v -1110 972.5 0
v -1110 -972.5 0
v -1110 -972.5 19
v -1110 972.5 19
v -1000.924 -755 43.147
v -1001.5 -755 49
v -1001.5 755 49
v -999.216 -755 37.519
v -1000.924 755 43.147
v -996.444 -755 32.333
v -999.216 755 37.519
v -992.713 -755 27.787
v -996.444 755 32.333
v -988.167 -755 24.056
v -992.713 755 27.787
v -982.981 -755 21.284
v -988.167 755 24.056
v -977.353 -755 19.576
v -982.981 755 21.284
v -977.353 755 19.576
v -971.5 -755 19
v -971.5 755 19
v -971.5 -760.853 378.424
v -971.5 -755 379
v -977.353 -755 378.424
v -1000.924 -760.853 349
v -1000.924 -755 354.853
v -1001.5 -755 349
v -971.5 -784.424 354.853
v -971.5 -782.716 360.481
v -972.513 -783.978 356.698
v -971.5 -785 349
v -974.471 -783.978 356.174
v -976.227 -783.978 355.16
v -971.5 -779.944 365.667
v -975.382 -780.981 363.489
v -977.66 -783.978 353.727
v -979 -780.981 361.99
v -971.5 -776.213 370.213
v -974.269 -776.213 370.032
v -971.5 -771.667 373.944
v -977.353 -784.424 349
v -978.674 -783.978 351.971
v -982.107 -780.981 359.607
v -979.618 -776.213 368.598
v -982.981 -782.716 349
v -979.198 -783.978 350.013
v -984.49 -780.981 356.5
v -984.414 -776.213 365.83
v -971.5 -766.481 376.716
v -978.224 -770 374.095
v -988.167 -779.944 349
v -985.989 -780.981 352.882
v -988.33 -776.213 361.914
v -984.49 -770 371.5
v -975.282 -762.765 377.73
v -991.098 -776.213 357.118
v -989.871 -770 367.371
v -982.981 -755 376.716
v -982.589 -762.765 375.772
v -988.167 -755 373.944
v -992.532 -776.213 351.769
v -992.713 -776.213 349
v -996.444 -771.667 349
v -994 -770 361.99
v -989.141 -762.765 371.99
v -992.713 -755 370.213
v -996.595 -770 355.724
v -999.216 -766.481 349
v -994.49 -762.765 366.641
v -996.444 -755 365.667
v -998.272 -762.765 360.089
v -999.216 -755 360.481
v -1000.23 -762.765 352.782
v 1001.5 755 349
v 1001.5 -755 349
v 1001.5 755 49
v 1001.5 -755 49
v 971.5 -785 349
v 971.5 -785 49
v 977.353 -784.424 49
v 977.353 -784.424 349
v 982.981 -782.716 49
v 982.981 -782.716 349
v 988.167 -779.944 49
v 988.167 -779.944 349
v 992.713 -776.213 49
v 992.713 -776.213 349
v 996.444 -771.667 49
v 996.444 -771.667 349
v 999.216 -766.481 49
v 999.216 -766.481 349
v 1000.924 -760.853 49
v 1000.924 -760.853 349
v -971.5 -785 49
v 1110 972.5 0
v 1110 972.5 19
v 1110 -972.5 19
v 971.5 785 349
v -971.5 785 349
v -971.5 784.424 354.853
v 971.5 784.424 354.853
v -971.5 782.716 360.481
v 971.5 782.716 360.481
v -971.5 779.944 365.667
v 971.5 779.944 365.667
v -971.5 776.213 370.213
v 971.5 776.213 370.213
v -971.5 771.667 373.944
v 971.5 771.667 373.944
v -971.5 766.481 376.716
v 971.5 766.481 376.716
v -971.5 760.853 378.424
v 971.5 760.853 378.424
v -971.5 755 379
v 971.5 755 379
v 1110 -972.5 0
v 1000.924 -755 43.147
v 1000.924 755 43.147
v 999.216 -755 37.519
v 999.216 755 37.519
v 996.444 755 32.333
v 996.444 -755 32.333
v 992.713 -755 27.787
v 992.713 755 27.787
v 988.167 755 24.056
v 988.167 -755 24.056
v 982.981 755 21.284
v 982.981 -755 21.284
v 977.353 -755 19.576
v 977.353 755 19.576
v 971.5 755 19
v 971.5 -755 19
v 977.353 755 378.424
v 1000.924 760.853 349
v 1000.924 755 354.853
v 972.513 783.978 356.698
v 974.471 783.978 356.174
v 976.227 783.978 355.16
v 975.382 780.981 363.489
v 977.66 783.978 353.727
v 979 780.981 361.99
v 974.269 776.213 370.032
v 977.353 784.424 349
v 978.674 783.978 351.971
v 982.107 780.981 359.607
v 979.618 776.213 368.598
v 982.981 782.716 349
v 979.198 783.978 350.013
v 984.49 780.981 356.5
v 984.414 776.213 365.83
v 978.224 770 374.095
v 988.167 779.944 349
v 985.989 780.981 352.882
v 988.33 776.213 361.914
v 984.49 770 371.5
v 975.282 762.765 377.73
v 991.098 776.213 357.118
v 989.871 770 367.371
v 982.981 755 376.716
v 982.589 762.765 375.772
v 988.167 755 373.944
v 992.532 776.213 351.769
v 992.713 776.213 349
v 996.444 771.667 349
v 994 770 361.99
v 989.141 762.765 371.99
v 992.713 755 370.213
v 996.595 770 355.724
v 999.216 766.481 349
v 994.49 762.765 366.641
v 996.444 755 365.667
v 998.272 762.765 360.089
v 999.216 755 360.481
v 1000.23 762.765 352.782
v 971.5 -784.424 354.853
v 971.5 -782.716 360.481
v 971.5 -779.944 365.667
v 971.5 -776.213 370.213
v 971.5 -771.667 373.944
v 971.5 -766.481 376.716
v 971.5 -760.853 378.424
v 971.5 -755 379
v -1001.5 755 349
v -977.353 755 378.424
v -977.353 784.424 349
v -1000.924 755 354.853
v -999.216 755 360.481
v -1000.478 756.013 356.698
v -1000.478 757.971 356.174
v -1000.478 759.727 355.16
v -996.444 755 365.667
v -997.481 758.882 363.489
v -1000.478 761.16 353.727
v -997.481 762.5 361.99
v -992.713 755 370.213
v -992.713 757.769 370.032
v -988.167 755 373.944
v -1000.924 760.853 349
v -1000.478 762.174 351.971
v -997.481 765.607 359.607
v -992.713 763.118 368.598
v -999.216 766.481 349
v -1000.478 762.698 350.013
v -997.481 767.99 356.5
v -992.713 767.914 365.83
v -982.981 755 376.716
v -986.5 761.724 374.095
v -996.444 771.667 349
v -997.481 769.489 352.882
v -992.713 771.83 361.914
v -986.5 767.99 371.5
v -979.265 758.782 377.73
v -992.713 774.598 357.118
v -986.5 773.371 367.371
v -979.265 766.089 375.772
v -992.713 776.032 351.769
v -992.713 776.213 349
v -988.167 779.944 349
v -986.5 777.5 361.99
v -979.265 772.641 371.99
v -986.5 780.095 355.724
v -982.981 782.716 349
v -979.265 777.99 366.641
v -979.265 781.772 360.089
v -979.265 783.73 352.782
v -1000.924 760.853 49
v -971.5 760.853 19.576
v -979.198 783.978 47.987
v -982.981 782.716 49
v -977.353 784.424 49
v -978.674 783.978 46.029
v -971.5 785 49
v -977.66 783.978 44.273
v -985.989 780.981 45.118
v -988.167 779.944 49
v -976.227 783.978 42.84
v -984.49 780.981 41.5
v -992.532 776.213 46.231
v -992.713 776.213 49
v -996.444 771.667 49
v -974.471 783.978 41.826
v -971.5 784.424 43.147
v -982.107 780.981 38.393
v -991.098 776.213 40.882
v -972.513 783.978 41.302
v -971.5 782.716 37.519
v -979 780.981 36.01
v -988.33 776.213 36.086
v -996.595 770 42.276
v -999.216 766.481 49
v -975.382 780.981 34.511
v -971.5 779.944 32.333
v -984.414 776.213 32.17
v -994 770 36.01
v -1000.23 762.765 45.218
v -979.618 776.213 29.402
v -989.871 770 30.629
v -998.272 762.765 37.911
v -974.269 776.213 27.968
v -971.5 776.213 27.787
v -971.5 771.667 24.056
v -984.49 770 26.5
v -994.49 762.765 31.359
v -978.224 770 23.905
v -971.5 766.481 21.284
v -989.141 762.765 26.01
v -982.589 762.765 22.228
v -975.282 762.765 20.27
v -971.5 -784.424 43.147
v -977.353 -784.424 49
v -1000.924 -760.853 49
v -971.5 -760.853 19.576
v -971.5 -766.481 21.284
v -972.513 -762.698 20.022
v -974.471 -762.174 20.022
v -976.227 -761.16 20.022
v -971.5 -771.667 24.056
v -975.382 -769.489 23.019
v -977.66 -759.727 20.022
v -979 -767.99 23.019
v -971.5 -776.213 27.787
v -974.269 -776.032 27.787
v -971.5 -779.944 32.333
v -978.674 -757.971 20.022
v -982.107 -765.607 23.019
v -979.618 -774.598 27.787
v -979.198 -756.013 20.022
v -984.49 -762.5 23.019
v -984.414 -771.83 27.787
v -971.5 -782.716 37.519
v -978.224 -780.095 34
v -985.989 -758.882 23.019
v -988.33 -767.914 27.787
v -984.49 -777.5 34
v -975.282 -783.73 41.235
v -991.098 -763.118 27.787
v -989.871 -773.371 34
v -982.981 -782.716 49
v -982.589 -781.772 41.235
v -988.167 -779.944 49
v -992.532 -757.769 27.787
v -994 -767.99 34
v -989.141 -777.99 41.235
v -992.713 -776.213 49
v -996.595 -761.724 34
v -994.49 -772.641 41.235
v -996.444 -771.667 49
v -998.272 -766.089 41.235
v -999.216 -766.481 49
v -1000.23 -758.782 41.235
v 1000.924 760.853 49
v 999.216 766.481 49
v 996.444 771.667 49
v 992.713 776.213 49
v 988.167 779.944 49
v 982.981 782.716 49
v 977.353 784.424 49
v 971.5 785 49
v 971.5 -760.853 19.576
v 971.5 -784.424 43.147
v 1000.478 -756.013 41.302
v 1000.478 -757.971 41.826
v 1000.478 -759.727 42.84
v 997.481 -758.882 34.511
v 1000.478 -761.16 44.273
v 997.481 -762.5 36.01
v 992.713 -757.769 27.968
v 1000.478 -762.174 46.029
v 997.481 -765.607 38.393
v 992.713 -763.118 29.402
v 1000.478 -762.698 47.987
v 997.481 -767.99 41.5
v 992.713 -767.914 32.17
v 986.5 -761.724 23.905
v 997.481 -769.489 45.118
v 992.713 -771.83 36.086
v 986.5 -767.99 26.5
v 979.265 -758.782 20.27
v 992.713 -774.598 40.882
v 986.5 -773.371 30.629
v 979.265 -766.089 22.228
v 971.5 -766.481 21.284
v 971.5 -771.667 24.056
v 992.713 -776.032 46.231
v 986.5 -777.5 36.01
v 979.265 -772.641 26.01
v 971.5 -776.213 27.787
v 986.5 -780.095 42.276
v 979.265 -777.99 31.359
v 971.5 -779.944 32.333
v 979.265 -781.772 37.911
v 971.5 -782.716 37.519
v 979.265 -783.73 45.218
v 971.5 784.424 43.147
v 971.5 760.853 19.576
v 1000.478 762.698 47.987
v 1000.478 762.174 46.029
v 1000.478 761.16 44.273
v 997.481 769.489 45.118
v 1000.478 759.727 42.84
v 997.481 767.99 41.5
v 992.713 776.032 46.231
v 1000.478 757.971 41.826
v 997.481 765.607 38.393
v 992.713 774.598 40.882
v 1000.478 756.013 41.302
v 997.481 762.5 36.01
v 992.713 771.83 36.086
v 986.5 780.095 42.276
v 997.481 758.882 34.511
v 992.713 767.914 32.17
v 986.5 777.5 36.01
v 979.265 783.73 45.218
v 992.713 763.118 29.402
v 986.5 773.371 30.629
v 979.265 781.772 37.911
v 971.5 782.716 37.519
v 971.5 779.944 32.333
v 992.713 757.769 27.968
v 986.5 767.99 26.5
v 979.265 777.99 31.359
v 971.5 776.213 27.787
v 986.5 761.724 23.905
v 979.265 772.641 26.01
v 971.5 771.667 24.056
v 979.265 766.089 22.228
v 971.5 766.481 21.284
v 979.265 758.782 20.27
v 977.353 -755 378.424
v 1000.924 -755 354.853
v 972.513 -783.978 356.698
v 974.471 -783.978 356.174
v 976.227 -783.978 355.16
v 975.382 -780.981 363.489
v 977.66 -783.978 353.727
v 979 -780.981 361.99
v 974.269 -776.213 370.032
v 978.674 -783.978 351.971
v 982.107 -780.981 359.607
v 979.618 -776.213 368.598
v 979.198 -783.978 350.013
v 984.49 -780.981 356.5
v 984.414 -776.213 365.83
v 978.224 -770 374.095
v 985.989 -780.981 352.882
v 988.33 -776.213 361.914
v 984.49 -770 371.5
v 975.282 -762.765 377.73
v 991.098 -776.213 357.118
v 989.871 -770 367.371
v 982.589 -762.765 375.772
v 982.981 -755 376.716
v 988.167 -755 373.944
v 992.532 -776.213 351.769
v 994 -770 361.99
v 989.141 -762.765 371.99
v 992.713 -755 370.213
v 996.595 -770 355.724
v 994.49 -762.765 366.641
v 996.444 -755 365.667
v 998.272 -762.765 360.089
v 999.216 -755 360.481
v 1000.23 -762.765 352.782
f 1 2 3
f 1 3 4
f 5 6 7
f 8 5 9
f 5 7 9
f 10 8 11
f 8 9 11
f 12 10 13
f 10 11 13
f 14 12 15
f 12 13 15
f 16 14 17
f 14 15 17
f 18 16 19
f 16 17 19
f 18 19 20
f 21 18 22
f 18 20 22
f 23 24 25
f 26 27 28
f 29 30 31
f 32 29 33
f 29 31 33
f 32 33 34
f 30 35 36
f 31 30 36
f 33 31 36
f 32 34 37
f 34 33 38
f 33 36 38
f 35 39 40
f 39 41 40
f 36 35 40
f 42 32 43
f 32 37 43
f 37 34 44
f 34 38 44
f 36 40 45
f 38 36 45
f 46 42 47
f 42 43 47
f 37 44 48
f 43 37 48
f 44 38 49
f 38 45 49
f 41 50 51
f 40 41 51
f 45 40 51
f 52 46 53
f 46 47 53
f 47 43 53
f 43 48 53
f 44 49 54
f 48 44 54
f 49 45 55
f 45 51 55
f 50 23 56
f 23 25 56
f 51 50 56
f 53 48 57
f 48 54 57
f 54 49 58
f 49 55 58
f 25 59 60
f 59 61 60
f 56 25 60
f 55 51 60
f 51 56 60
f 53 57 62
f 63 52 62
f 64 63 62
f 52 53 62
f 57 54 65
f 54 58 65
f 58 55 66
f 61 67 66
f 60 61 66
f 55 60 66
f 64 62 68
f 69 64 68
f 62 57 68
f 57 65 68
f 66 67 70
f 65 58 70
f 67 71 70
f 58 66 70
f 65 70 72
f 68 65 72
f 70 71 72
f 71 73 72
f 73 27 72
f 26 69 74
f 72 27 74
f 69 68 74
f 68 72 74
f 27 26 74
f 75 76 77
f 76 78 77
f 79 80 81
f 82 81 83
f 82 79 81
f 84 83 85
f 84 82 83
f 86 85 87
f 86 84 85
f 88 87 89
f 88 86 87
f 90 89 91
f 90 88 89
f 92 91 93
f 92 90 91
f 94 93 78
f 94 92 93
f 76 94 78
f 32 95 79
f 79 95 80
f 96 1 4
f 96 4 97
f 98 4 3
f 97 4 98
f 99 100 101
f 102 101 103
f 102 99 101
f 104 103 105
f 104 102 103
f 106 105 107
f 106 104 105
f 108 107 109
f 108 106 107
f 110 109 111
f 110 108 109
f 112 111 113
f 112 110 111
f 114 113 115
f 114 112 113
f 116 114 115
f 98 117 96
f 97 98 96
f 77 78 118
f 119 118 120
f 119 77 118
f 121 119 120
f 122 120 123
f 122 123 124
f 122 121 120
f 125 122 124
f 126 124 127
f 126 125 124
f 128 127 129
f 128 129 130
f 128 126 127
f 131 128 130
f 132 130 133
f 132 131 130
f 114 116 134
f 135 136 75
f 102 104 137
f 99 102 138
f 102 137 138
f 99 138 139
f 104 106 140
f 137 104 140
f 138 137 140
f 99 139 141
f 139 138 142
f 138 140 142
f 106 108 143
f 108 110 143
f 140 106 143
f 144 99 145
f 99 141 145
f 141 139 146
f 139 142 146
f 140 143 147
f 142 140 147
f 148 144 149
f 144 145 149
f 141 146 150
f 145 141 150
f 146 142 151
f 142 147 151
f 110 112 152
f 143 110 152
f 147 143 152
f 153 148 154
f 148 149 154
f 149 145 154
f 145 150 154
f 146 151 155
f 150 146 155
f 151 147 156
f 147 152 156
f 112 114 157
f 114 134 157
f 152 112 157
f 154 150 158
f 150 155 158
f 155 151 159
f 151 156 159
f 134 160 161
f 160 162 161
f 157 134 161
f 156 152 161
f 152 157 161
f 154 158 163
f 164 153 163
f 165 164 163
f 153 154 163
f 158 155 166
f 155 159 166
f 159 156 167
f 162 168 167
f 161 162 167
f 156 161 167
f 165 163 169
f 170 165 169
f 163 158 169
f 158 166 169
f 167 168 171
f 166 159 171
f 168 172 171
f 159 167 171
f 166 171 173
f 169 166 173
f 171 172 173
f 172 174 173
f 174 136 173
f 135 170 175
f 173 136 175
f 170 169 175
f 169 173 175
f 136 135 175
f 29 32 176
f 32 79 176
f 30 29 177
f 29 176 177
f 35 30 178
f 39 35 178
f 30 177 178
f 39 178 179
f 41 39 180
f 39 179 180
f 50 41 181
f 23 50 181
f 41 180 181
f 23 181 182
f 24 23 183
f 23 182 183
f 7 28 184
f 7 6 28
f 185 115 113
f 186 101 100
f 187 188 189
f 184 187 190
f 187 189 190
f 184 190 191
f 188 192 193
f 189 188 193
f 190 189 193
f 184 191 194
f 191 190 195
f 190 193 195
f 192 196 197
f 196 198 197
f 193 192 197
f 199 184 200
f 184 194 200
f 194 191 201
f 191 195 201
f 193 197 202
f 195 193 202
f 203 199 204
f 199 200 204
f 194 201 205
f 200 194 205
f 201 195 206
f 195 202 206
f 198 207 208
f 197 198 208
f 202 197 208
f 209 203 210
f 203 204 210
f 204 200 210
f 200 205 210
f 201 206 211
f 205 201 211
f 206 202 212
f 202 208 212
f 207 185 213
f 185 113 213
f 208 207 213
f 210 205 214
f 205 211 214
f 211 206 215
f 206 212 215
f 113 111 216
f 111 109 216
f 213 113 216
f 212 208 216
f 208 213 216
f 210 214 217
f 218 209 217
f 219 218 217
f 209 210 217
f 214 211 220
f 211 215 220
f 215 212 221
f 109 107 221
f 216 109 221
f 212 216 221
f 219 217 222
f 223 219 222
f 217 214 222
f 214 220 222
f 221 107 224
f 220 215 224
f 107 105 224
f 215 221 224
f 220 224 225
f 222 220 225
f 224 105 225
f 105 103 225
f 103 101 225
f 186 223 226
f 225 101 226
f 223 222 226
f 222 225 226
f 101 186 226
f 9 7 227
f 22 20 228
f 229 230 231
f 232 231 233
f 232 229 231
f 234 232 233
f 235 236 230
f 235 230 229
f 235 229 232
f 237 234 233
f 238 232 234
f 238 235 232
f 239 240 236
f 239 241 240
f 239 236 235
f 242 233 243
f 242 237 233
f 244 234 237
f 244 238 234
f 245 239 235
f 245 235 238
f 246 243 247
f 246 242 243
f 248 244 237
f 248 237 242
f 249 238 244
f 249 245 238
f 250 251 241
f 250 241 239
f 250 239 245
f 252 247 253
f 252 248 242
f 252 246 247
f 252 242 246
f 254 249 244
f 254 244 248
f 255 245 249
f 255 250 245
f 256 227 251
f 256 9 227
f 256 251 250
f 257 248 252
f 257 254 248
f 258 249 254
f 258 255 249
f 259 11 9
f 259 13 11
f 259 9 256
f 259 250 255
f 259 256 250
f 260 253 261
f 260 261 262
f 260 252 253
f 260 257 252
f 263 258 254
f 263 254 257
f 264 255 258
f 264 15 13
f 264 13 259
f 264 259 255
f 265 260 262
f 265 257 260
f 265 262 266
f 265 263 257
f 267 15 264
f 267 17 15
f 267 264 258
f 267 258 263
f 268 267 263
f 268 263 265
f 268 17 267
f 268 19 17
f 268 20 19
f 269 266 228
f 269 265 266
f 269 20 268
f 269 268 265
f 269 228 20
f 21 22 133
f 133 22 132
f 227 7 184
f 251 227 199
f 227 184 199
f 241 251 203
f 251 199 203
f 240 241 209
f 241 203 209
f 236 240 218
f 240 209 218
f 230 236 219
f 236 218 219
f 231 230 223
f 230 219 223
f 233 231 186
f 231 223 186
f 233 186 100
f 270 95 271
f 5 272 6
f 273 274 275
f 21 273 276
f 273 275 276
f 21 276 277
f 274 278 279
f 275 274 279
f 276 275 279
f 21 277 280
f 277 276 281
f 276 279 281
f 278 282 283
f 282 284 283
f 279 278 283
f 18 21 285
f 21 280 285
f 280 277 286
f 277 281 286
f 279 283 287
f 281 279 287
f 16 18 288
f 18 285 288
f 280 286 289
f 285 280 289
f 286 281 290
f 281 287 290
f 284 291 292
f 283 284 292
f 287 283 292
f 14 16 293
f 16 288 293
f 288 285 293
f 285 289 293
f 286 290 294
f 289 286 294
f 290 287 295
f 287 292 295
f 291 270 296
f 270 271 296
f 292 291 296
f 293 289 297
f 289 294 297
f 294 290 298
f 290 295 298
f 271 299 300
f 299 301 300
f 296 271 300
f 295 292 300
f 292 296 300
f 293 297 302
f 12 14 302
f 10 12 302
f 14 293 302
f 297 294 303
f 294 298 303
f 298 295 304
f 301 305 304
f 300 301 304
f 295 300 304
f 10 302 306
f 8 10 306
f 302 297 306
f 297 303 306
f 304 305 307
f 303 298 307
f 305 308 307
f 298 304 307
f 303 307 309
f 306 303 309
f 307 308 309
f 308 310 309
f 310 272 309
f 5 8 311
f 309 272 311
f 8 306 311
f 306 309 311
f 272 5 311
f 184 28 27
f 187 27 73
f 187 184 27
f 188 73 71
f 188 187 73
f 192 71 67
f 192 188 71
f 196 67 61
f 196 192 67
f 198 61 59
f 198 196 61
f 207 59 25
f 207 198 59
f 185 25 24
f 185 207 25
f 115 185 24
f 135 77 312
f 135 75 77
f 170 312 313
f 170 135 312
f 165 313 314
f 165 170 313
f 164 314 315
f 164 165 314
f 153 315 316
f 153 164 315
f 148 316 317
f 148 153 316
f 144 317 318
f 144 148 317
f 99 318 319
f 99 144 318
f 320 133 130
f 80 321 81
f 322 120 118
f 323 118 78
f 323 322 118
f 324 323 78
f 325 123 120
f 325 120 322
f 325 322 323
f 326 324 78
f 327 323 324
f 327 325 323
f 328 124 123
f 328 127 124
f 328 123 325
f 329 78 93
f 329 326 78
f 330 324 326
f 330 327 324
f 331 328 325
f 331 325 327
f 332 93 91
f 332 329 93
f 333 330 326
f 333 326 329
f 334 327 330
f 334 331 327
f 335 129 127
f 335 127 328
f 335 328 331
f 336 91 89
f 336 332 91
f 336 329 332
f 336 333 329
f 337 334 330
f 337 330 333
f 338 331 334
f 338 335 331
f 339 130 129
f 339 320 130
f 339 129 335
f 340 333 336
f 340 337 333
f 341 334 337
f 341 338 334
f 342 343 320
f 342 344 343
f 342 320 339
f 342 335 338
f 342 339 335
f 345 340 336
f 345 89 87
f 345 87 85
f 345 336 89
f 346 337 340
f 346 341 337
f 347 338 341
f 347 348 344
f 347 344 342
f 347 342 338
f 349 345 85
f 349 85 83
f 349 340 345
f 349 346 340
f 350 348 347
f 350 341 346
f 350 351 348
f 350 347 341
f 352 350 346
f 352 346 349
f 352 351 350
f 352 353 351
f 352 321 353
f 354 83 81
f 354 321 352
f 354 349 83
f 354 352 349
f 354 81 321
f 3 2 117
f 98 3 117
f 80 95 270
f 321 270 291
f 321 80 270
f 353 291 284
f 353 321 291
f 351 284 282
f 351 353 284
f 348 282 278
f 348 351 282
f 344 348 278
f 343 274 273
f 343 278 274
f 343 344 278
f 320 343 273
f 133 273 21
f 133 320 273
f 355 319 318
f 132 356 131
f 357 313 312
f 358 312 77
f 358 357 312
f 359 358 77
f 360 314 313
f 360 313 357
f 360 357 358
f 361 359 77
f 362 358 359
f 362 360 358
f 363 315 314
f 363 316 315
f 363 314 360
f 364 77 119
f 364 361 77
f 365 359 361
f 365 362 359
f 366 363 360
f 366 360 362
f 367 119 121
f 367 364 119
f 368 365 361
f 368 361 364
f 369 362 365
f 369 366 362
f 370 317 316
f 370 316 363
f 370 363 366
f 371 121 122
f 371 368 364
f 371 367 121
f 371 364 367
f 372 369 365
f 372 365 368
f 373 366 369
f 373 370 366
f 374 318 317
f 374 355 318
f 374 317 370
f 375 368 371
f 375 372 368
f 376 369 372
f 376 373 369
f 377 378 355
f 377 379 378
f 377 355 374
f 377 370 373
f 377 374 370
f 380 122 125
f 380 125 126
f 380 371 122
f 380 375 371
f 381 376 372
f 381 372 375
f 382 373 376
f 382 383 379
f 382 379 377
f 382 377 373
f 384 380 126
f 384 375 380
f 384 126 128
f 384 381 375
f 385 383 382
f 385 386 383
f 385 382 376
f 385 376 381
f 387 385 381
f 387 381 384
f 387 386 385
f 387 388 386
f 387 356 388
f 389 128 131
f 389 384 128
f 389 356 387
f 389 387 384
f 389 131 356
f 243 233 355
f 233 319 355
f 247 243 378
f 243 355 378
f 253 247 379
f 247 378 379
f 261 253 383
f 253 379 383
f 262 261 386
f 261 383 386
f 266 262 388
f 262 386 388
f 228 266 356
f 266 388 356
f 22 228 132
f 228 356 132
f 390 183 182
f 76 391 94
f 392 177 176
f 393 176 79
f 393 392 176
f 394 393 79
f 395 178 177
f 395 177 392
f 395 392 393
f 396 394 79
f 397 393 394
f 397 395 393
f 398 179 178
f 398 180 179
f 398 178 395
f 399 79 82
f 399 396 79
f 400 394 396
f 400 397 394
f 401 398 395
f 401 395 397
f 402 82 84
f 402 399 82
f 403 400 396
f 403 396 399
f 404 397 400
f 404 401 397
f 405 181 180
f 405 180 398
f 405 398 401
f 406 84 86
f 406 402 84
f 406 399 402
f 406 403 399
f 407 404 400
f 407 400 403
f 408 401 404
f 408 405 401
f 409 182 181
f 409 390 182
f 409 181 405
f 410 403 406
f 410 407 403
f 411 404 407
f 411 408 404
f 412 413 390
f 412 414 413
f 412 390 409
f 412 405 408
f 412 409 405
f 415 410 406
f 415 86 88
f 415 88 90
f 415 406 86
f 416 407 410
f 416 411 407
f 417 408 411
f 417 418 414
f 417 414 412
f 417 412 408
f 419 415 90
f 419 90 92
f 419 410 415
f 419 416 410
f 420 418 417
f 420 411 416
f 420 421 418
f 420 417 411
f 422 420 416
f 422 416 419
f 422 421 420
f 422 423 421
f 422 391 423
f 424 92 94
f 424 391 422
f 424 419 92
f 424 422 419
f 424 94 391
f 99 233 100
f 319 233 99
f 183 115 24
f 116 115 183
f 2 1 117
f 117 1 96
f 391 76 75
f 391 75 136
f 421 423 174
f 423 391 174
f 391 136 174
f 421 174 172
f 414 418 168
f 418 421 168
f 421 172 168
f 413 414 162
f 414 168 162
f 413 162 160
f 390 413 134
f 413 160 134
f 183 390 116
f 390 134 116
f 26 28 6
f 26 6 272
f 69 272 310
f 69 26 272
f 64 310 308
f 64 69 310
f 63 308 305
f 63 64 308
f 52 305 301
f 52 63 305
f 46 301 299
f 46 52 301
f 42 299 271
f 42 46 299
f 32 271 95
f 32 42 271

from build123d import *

# Parameters (mm, degrees)
F0_W     = 2220
F0_H     = 1945
F1_DEPTH = 19
F2_W     = 2003
F2_H     = 1570
F3_DEPTH = 360
F4_R     = 30


with BuildPart() as f1:
    # F0 (on Top) → F1 (new body)
    with BuildSketch(Plane.XY):
        Rectangle(F0_W, F0_H)
    extrude(amount=F1_DEPTH)


with BuildPart() as f3:
    # F2 (on face) → F3 (new body)
    with BuildSketch(Plane.XY.offset(19)):
        Rectangle(F2_W, F2_H)
    extrude(amount=F3_DEPTH)

    # F4
    f4_edges = [f3.edges().sort_by_distance(p)[0] for p in [
        (1001.5, 0, 379),
        (0, 785, 379),
        (-1001.5, 0, 379),
        (0, -785, 379),
        (-1001.5, -785, 199),
        (0, -785, 19),
        (-1001.5, 0, 19),
        (-1001.5, 785, 199),
        (0, 785, 19),
        (1001.5, 785, 199),
        (1001.5, 0, 19),
        (1001.5, -785, 199),
    ]]
    fillet(f4_edges, radius=F4_R)


solid = Compound([f1.part, f3.part])
